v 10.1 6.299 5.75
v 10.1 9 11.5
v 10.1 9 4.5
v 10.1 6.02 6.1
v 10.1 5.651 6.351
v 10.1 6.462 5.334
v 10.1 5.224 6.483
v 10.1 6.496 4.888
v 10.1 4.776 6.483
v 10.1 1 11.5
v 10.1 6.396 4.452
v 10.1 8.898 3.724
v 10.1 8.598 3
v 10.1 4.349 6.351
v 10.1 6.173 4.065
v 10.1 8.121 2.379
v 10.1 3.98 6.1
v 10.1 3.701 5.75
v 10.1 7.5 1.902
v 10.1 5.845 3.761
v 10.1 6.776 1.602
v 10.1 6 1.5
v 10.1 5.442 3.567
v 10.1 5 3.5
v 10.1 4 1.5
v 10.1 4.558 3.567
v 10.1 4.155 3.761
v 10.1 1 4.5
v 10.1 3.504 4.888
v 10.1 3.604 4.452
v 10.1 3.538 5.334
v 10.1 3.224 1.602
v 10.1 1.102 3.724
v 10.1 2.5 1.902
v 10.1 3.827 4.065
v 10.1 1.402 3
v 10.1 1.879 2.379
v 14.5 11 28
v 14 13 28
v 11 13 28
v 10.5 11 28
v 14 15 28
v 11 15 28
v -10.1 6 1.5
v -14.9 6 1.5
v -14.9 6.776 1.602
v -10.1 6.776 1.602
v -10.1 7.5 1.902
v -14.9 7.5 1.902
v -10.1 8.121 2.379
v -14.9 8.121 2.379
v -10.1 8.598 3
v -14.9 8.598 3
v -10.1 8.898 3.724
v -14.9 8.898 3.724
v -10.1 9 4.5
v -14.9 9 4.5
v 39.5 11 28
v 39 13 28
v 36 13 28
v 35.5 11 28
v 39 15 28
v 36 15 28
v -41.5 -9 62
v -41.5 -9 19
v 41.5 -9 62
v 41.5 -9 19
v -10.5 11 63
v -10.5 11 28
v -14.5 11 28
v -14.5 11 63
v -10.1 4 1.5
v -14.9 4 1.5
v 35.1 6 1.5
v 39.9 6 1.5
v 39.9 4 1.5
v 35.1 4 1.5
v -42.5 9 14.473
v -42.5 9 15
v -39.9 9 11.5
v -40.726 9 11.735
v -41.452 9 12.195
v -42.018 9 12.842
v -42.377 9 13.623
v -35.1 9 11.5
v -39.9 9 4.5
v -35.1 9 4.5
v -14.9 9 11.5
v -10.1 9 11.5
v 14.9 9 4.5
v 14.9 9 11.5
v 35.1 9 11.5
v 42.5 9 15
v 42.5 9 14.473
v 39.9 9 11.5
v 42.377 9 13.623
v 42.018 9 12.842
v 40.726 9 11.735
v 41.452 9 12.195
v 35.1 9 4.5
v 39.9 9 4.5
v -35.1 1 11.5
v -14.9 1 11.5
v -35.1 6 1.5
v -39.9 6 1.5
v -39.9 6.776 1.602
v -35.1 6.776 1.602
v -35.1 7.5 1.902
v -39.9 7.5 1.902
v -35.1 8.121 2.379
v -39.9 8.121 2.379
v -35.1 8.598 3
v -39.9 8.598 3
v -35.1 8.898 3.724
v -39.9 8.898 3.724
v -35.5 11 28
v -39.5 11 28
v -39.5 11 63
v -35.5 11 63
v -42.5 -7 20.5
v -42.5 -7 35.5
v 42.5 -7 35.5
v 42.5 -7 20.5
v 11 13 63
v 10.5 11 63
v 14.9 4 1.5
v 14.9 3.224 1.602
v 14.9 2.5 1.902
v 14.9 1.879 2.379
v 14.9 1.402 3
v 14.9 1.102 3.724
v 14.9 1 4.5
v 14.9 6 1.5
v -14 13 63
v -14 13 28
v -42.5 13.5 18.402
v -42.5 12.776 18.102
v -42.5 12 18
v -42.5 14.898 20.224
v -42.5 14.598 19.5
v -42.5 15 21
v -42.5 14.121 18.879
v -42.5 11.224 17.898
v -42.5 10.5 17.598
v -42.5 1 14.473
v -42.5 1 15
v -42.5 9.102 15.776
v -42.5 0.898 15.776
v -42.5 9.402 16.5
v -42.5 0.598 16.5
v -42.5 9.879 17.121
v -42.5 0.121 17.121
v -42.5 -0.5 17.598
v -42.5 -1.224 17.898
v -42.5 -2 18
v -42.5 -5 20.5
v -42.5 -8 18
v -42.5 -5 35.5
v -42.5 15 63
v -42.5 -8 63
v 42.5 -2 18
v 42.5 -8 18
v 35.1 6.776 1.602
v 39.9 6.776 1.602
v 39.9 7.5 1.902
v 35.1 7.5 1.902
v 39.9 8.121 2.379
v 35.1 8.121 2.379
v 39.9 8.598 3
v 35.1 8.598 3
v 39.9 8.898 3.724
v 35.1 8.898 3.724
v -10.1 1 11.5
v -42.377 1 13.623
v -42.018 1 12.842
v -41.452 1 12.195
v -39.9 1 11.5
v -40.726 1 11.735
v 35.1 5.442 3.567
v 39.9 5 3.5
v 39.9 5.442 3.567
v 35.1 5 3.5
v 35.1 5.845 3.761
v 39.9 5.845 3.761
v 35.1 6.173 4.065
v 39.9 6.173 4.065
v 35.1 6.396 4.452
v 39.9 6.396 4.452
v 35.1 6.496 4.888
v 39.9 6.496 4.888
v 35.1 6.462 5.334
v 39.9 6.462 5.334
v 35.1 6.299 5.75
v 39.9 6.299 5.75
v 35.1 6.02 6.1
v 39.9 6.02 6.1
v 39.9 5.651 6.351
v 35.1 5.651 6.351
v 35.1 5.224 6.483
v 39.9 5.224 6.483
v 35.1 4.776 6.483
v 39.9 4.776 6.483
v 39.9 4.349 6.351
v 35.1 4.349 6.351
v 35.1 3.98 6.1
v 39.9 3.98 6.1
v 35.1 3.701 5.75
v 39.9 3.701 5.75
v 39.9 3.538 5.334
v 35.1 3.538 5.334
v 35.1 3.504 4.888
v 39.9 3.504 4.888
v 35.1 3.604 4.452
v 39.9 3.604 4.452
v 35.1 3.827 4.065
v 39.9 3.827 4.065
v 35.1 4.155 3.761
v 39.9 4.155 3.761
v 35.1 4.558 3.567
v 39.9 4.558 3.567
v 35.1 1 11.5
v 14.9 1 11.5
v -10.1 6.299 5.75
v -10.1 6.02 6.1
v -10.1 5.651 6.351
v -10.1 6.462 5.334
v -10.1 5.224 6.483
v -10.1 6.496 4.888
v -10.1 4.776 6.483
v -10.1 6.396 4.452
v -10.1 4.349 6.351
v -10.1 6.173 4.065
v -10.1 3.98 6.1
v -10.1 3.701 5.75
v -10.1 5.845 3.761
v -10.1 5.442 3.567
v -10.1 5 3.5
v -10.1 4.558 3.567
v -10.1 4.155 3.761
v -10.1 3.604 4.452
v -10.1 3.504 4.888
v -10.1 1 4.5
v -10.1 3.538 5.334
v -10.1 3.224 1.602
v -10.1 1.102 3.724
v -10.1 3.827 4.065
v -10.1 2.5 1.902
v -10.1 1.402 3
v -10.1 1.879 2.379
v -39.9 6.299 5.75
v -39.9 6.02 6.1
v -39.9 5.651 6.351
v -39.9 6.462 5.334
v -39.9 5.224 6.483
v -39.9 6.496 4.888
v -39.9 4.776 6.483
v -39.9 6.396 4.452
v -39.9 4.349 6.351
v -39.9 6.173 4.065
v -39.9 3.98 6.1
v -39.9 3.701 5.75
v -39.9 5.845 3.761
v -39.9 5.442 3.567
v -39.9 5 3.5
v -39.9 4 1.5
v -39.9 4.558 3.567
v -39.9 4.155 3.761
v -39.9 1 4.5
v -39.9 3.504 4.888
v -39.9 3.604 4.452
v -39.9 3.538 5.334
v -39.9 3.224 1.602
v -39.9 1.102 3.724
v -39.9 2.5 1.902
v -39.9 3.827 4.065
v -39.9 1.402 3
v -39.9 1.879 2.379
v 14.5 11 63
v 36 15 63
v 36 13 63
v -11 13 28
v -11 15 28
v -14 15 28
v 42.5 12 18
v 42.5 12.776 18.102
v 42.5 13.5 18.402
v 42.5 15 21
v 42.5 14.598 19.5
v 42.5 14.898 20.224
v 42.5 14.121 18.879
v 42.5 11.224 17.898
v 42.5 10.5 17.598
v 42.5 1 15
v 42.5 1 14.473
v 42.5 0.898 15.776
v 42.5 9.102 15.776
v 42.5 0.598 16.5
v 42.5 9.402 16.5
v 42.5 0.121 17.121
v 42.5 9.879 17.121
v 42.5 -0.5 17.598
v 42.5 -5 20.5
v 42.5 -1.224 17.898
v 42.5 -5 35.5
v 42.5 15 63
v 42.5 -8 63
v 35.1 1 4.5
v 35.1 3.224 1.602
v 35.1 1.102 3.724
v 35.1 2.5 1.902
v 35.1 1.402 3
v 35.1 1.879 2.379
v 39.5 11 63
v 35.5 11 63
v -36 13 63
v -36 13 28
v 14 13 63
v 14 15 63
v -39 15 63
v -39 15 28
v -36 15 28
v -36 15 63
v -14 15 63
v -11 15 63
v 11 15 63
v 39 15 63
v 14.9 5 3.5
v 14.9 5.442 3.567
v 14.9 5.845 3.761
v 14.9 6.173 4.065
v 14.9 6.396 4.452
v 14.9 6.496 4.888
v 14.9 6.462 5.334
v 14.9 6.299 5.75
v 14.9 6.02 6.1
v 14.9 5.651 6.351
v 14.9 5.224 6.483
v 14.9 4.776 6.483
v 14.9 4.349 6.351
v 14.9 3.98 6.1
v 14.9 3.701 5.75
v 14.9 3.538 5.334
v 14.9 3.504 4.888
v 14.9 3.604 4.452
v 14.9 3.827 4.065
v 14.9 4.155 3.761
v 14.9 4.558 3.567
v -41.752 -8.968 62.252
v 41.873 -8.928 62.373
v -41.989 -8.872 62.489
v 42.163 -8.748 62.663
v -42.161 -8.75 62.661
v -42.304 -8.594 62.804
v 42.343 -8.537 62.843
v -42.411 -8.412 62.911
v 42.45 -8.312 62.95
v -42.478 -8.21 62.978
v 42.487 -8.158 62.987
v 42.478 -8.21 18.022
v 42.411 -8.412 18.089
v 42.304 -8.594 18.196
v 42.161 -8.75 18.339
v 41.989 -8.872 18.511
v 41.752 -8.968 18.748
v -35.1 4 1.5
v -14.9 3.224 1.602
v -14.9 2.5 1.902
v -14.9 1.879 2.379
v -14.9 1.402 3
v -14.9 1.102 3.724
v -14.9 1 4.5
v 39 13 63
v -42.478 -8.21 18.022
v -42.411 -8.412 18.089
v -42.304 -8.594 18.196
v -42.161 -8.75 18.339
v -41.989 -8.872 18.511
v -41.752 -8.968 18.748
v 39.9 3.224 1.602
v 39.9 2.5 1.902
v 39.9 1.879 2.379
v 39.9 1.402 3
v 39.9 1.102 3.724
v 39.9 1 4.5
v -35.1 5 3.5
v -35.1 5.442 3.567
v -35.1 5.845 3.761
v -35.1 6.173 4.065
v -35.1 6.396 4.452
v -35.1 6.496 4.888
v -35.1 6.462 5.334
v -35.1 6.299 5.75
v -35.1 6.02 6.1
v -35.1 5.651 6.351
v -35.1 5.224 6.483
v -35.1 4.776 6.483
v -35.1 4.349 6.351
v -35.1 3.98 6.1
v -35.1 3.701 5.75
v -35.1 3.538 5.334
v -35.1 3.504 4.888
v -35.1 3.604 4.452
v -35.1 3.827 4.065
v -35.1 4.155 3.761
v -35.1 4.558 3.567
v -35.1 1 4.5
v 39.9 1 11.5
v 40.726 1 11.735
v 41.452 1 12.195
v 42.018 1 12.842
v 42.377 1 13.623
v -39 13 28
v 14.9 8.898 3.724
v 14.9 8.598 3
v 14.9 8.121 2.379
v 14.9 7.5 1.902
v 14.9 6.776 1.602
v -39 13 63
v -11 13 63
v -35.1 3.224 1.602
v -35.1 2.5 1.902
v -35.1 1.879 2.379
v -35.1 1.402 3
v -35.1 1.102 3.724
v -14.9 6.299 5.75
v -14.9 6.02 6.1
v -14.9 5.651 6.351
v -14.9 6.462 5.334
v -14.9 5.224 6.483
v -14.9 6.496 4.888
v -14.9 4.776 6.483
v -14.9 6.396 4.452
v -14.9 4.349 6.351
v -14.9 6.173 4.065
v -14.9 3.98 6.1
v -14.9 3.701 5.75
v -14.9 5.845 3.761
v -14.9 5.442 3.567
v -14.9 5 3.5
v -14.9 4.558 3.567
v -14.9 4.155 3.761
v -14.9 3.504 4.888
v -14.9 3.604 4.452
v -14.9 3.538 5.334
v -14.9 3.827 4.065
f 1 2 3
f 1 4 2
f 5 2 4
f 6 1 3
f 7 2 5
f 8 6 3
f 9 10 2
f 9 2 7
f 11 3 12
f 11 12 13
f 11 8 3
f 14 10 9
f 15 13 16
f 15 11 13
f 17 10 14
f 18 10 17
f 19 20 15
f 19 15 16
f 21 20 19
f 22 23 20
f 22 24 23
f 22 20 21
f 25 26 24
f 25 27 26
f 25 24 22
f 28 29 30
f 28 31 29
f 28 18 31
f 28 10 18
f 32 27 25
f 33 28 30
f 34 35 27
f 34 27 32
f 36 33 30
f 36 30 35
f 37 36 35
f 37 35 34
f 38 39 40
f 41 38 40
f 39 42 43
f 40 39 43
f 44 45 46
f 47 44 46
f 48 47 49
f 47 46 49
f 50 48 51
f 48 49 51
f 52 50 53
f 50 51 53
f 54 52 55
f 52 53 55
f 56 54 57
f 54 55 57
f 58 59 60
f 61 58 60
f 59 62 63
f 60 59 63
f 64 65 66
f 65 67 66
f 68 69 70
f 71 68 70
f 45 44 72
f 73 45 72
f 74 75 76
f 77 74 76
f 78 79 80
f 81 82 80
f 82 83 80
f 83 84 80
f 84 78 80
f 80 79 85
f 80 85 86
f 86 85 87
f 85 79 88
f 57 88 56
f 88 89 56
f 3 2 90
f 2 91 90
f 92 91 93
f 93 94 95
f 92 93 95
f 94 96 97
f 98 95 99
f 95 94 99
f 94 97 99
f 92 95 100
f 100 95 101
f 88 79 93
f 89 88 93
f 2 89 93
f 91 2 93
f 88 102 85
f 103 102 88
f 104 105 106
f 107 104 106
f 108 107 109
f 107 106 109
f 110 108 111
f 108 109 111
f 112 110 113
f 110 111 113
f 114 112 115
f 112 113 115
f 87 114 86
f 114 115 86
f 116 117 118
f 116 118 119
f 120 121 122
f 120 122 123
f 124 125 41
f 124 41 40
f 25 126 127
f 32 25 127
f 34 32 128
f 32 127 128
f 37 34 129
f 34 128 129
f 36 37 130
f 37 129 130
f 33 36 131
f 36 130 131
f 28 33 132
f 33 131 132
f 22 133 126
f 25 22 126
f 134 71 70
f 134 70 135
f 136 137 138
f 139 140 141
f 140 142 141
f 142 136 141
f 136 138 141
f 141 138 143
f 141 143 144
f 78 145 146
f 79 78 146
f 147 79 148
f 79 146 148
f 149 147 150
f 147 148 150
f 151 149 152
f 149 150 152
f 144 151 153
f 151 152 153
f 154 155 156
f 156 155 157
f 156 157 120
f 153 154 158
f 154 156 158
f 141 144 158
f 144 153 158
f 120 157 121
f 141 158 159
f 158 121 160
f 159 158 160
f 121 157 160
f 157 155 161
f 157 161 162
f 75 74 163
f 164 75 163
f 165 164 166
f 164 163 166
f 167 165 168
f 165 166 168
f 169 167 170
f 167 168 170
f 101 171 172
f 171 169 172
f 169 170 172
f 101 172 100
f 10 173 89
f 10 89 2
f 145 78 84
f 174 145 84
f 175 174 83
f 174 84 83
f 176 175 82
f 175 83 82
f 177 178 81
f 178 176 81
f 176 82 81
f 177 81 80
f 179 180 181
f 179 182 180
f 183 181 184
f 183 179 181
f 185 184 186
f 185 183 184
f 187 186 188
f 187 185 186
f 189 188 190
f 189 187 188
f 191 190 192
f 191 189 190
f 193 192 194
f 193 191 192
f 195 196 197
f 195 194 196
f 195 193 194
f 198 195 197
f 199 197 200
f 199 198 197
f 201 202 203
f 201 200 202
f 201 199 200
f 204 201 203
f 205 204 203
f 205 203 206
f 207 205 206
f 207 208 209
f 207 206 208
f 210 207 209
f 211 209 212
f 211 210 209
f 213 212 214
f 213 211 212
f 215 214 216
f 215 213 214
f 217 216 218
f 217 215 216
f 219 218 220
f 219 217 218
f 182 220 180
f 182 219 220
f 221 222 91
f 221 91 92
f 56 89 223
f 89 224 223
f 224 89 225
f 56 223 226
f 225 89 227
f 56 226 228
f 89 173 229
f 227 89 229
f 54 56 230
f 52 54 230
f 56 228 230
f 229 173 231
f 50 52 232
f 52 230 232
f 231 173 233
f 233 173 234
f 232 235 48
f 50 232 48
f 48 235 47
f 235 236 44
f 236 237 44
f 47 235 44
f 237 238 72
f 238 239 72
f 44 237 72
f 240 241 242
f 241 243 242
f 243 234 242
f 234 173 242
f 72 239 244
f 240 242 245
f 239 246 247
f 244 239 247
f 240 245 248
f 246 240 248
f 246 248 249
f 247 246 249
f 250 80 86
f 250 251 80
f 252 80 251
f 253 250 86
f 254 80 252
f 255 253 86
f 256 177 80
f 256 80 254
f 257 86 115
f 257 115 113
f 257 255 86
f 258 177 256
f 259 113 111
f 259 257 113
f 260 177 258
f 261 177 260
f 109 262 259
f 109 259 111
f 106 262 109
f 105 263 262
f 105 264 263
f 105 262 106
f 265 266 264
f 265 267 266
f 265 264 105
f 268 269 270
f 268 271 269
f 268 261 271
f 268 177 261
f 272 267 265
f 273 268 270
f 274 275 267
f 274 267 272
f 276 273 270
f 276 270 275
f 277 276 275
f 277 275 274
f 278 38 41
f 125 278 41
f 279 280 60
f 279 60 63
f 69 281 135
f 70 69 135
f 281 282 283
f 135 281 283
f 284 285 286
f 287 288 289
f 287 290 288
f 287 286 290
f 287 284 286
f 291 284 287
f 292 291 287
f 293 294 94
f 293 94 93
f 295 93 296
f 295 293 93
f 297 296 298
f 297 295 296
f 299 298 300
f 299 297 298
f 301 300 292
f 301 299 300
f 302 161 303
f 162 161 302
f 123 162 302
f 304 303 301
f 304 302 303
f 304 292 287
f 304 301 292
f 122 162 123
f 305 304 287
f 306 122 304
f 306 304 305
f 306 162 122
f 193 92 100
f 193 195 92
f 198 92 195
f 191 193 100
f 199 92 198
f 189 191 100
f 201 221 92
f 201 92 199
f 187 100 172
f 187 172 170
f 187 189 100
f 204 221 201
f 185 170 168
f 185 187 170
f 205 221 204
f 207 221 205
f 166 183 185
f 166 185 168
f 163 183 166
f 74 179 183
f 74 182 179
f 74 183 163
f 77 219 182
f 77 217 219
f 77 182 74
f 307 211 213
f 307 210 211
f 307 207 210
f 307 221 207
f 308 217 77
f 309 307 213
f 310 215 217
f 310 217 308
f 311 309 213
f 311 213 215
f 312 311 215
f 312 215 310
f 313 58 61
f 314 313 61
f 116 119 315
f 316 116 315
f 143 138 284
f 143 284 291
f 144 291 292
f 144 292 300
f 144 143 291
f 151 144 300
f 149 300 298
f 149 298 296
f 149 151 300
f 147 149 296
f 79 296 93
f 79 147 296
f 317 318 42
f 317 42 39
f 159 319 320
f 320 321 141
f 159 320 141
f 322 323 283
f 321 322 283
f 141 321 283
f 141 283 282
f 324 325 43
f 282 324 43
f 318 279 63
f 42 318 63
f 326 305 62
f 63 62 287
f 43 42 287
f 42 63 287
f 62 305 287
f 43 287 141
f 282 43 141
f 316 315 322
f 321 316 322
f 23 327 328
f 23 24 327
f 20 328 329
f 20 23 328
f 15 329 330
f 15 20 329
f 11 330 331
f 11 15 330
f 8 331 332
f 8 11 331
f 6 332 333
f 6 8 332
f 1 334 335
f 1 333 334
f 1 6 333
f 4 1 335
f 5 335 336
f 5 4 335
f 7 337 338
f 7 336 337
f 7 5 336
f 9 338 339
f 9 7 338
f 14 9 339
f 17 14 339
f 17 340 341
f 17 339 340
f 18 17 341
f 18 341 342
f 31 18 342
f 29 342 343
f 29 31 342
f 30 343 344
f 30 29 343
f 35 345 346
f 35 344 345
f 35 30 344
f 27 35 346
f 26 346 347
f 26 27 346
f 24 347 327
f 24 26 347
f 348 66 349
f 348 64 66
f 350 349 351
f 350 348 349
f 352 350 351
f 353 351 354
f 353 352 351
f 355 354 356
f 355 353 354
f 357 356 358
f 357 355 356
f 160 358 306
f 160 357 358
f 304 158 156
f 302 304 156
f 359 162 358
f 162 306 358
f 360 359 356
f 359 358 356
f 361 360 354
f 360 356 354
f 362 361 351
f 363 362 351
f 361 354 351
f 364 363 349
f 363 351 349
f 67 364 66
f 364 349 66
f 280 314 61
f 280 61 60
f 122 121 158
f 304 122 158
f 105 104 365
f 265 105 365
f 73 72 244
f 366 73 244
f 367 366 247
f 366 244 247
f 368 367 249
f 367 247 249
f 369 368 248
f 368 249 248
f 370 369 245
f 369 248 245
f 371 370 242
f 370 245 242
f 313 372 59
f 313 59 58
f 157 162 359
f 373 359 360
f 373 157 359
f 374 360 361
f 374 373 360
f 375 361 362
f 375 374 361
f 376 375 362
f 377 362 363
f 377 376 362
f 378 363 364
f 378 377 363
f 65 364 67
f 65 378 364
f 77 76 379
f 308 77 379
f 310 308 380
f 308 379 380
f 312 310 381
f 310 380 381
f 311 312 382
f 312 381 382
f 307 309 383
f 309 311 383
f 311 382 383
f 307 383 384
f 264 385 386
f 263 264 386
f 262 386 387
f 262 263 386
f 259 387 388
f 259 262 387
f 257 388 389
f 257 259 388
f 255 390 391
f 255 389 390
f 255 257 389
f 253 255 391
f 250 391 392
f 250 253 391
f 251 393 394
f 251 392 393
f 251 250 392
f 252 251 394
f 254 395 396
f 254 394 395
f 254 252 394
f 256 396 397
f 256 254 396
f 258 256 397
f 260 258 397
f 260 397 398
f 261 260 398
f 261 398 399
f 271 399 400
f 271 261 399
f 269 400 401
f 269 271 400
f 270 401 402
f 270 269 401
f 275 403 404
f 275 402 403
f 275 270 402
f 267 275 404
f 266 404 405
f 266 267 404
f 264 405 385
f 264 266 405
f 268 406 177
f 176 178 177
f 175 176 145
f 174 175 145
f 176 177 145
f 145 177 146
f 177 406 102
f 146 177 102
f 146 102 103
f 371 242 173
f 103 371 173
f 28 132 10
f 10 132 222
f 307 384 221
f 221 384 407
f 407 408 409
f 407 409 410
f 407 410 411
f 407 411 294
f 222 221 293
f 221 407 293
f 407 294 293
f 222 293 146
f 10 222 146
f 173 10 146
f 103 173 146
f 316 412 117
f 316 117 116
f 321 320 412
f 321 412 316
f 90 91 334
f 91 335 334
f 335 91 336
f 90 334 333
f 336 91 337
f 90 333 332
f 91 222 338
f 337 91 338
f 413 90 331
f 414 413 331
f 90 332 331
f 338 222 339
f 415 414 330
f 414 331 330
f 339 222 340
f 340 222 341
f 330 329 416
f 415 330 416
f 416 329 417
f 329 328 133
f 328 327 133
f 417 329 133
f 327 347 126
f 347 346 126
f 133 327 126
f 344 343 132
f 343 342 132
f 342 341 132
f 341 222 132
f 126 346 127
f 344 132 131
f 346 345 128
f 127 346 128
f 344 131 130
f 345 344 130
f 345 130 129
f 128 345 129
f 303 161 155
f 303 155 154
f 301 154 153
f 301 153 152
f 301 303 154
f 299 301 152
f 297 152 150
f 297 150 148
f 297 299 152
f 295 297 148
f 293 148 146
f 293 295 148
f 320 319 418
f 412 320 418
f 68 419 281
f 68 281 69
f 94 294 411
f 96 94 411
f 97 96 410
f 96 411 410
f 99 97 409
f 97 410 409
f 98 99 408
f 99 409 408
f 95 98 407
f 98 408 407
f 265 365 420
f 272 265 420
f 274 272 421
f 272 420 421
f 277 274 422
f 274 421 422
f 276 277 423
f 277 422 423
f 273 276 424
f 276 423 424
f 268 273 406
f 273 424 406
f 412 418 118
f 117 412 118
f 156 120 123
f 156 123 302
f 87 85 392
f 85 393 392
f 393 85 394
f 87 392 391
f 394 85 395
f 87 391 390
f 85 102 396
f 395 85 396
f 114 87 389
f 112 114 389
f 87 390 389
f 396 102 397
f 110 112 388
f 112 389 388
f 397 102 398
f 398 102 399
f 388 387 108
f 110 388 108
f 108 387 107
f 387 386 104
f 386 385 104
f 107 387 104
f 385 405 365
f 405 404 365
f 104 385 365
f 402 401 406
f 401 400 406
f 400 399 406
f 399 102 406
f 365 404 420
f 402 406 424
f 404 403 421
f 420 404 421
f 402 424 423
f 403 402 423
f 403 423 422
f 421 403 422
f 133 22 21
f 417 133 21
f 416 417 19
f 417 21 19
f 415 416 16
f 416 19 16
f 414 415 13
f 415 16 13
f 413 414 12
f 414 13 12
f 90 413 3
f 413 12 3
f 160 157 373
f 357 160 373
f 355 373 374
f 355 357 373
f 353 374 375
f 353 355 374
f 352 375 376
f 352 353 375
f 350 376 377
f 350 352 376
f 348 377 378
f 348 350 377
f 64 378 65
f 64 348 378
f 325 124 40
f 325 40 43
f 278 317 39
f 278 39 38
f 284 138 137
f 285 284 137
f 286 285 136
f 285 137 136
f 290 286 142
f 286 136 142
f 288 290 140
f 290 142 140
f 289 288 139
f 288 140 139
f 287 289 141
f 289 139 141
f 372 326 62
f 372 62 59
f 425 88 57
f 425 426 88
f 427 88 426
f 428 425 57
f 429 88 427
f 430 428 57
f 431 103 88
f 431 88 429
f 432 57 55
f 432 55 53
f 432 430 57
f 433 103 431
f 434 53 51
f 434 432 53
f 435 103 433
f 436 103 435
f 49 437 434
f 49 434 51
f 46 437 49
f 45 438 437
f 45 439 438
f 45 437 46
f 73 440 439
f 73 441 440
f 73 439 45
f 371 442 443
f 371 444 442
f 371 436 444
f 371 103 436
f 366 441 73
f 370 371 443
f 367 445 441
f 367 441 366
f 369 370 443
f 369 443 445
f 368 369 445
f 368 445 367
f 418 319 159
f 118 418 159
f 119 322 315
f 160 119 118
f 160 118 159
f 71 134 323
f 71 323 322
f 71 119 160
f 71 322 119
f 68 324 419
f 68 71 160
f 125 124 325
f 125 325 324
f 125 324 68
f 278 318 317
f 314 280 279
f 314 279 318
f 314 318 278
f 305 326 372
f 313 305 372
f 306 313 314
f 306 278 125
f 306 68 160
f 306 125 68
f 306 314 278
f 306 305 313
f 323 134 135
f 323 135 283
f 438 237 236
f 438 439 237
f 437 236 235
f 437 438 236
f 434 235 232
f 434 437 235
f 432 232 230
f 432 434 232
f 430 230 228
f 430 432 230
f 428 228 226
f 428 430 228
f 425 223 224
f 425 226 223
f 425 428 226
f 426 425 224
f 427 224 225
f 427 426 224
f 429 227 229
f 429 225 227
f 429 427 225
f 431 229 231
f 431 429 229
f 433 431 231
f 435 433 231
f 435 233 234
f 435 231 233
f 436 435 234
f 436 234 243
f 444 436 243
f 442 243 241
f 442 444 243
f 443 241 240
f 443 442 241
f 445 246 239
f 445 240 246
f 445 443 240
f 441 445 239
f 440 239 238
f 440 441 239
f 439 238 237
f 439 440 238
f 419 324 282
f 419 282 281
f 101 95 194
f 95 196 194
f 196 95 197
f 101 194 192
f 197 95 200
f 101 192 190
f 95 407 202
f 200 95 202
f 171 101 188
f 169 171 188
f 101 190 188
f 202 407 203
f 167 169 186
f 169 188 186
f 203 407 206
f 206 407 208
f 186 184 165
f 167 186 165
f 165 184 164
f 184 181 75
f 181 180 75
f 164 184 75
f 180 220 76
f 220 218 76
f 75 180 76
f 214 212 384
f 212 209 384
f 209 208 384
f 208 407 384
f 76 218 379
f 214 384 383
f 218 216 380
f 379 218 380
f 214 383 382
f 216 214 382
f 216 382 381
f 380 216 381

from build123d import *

# Parameters (mm, degrees)
CROQUIS1_R                 = 1.5
SALIENTE_EXTRUIR1_DEPTH    = 42.5
CORTAR_EXTRUIR1_DEPTH      = 78.46128065
CORTAR_EXTRUIR1_DEPTH_BACK = 78.46128065
CROQUIS2_W                 = 2.6
CROQUIS2_H                 = 10
CROQUIS2_W_2               = 20.2
CORTAR_EXTRUIR4_DEPTH      = 78.46128065
CORTAR_EXTRUIR4_DEPTH_BACK = 78.46128065
CROQUIS4_W                 = 15
CROQUIS4_H                 = 2
REDONDEO3_R                = 3
CORTAR_EXTRUIR6_DEPTH      = 35
REDONDEO2_R                = 1


with BuildPart() as part:
    # Croquis1 → Saliente-Extruir1 (new, symmetric)
    with BuildSketch(Plane(origin=(0, 0, 0), x_dir=(0, 0, -1), z_dir=(1, 0, 0))):
        Polygon((-1.5, 9), (-1.5, 1), (-18, 1), (-18, -9), (-63, -9), (-63, 9), (-63, 15), (-18, 15), (-18, 9), align=None)
        with Locations((-5, 5)):
            Circle(CROQUIS1_R, mode=Mode.SUBTRACT)
    extrude(amount=SALIENTE_EXTRUIR1_DEPTH, both=True)

    # Croquis2 → Cortar-Extruir1 (cut, two sides: drawn at the far end of the back side and taken through both)
    with BuildSketch(Plane(origin=(0, 0, 0), x_dir=(1, 0, 0), z_dir=(0, 1, 0)).offset(-CORTAR_EXTRUIR1_DEPTH_BACK)):
        with Locations((-41.2, -6.5)):
            Rectangle(CROQUIS2_W, CROQUIS2_H)
        with Locations((-25, -6.5)):
            Rectangle(CROQUIS2_W_2, CROQUIS2_H)
        with Locations((0, -6.5)):
            Rectangle(CROQUIS2_W_2, CROQUIS2_H)
        with Locations((25, -6.5)):
            Rectangle(CROQUIS2_W_2, CROQUIS2_H)
        with Locations((41.2, -6.5)):
            Rectangle(CROQUIS2_W, CROQUIS2_H)
    extrude(amount=CORTAR_EXTRUIR1_DEPTH + CORTAR_EXTRUIR1_DEPTH_BACK, mode=Mode.SUBTRACT)

    # Croquis4 → Cortar-Extruir4 (cut, two sides: drawn at the far end of the back side and taken through both)
    with BuildSketch(Plane(origin=(0, 0, 0), x_dir=(0, 0, -1), z_dir=(1, 0, 0)).offset(-CORTAR_EXTRUIR4_DEPTH_BACK)):
        with Locations((-28, -6)):
            Rectangle(CROQUIS4_W, CROQUIS4_H)
    extrude(amount=CORTAR_EXTRUIR4_DEPTH + CORTAR_EXTRUIR4_DEPTH_BACK, mode=Mode.SUBTRACT)

    # Redondeo3
    # the kernel refuses this fillet: 3 mm, written as the material it adds along each edge
    with BuildSketch(Plane(origin=(42.5, 1, 18), x_dir=(0, 0, -1), z_dir=(-1, 0, 0)), Plane(origin=(-42.5, 9, 18), x_dir=(0, 0, -1), z_dir=(1, 0, 0))) as redondeo3_piece_1:
        with BuildLine():
            CenterArc((REDONDEO3_R, REDONDEO3_R), REDONDEO3_R, 180, 90)
            Line((0, REDONDEO3_R), (0, 0))
            Line((0, 0), (REDONDEO3_R, 0))
        make_face()
    extrude(amount=85)
    # the kernel refuses this fillet: 3 mm, written as the material it takes off along each edge
    with BuildSketch(Plane(origin=(-47.4, 9, 1.5), x_dir=(0, -1, 0), z_dir=(1, 0, 0)), Plane(origin=(-27.6, 1, 1.5), x_dir=(0, 1, 0), z_dir=(-1, 0, 0))) as redondeo3_2_piece_1:
        with BuildLine():
            CenterArc((REDONDEO3_R, -REDONDEO3_R), REDONDEO3_R, 90, 90)
            Line((0, -REDONDEO3_R), (0, 0))
            Line((0, 0), (REDONDEO3_R, 0))
        make_face()
    extrude(amount=19.8, mode=Mode.SUBTRACT)
    with BuildSketch(Plane(origin=(27.6, 9, 1.5), x_dir=(0, 0, 1), z_dir=(1, 0, 0)), Plane(origin=(47.4, 1, 1.5), x_dir=(0, 0, 1), z_dir=(-1, 0, 0)), Plane(origin=(2.6, 9, 1.5), x_dir=(0, 0, 1), z_dir=(1, 0, 0)), Plane(origin=(22.4, 1, 1.5), x_dir=(0, 0, 1), z_dir=(-1, 0, 0)), Plane(origin=(-22.4, 9, 1.5), x_dir=(0, 0, 1), z_dir=(1, 0, 0)), Plane(origin=(-2.6, 1, 1.5), x_dir=(0, 0, 1), z_dir=(-1, 0, 0))) as redondeo3_2_piece_2:
        with BuildLine():
            CenterArc((REDONDEO3_R, REDONDEO3_R), REDONDEO3_R, 180, 90)
            Line((0, REDONDEO3_R), (0, 0))
            Line((0, 0), (REDONDEO3_R, 0))
        make_face()
    extrude(amount=19.8, mode=Mode.SUBTRACT)
    with BuildSketch(Plane(origin=(42.5, -6.433034374, 11.5), x_dir=(0, 0, 1), z_dir=(0, 1, 0))) as redondeo3_2_piece_3:
        with BuildLine():
            CenterArc((2.973213749, -3), REDONDEO3_R, 90, 82.337744339)
            Line((0, -2.6), (0, 0))
            Line((0, 0), (2.973213749, 0))
        make_face()
    extrude(amount=22.866068747, mode=Mode.SUBTRACT)
    with BuildSketch(Plane(origin=(-42.5, 16.433034374, 11.5), x_dir=(1, 0, 0), z_dir=(0, -1, 0))) as redondeo3_2_piece_4:
        with BuildLine():
            CenterArc((3, 2.973213749), REDONDEO3_R, 180, 82.337744339)
            Line((0, 2.973213749), (0, 0))
            Line((0, 0), (2.6, 0))
        make_face()
    extrude(amount=22.866068747, mode=Mode.SUBTRACT)
    with BuildSketch(Plane(origin=(-50, 15, 18), x_dir=(0, -1, 0), z_dir=(1, 0, 0))) as redondeo3_2_piece_5:
        with BuildLine():
            CenterArc((REDONDEO3_R, -REDONDEO3_R), REDONDEO3_R, 90, 90)
            Line((0, -REDONDEO3_R), (0, 0))
            Line((0, 0), (REDONDEO3_R, 0))
        make_face()
    extrude(amount=100, mode=Mode.SUBTRACT)

    # Croquis5 → Cortar-Extruir6 (cut)
    with BuildSketch(Plane(origin=(0, 0, 63), x_dir=(-1, 0, 0), z_dir=(0, 0, -1))):
        Polygon((11, 13), (10.5, 11), (14.5, 11), (14, 13), (14, 15), (11, 15), align=None)
        Polygon((-39, 13), (-39.5, 11), (-35.5, 11), (-36, 13), (-36, 15), (-39, 15), align=None)
        Polygon((36, 15), (39, 15), (39, 13), (39.5, 11), (35.5, 11), (36, 13), align=None)
        Polygon((-11, 15), (-14, 15), (-14, 13), (-14.5, 11), (-10.5, 11), (-11, 13), align=None)
    extrude(amount=CORTAR_EXTRUIR6_DEPTH, mode=Mode.SUBTRACT)

    # Redondeo2
    redondeo2_edges = [part.edges().sort_by_distance(p)[0] for p in [
        (-42.5, -9, 40.5),
        (0, -9, 18),
        (0, -9, 63),
        (42.5, -9, 40.5),
    ]]
    fillet(redondeo2_edges, radius=REDONDEO2_R)


solid = part.part
